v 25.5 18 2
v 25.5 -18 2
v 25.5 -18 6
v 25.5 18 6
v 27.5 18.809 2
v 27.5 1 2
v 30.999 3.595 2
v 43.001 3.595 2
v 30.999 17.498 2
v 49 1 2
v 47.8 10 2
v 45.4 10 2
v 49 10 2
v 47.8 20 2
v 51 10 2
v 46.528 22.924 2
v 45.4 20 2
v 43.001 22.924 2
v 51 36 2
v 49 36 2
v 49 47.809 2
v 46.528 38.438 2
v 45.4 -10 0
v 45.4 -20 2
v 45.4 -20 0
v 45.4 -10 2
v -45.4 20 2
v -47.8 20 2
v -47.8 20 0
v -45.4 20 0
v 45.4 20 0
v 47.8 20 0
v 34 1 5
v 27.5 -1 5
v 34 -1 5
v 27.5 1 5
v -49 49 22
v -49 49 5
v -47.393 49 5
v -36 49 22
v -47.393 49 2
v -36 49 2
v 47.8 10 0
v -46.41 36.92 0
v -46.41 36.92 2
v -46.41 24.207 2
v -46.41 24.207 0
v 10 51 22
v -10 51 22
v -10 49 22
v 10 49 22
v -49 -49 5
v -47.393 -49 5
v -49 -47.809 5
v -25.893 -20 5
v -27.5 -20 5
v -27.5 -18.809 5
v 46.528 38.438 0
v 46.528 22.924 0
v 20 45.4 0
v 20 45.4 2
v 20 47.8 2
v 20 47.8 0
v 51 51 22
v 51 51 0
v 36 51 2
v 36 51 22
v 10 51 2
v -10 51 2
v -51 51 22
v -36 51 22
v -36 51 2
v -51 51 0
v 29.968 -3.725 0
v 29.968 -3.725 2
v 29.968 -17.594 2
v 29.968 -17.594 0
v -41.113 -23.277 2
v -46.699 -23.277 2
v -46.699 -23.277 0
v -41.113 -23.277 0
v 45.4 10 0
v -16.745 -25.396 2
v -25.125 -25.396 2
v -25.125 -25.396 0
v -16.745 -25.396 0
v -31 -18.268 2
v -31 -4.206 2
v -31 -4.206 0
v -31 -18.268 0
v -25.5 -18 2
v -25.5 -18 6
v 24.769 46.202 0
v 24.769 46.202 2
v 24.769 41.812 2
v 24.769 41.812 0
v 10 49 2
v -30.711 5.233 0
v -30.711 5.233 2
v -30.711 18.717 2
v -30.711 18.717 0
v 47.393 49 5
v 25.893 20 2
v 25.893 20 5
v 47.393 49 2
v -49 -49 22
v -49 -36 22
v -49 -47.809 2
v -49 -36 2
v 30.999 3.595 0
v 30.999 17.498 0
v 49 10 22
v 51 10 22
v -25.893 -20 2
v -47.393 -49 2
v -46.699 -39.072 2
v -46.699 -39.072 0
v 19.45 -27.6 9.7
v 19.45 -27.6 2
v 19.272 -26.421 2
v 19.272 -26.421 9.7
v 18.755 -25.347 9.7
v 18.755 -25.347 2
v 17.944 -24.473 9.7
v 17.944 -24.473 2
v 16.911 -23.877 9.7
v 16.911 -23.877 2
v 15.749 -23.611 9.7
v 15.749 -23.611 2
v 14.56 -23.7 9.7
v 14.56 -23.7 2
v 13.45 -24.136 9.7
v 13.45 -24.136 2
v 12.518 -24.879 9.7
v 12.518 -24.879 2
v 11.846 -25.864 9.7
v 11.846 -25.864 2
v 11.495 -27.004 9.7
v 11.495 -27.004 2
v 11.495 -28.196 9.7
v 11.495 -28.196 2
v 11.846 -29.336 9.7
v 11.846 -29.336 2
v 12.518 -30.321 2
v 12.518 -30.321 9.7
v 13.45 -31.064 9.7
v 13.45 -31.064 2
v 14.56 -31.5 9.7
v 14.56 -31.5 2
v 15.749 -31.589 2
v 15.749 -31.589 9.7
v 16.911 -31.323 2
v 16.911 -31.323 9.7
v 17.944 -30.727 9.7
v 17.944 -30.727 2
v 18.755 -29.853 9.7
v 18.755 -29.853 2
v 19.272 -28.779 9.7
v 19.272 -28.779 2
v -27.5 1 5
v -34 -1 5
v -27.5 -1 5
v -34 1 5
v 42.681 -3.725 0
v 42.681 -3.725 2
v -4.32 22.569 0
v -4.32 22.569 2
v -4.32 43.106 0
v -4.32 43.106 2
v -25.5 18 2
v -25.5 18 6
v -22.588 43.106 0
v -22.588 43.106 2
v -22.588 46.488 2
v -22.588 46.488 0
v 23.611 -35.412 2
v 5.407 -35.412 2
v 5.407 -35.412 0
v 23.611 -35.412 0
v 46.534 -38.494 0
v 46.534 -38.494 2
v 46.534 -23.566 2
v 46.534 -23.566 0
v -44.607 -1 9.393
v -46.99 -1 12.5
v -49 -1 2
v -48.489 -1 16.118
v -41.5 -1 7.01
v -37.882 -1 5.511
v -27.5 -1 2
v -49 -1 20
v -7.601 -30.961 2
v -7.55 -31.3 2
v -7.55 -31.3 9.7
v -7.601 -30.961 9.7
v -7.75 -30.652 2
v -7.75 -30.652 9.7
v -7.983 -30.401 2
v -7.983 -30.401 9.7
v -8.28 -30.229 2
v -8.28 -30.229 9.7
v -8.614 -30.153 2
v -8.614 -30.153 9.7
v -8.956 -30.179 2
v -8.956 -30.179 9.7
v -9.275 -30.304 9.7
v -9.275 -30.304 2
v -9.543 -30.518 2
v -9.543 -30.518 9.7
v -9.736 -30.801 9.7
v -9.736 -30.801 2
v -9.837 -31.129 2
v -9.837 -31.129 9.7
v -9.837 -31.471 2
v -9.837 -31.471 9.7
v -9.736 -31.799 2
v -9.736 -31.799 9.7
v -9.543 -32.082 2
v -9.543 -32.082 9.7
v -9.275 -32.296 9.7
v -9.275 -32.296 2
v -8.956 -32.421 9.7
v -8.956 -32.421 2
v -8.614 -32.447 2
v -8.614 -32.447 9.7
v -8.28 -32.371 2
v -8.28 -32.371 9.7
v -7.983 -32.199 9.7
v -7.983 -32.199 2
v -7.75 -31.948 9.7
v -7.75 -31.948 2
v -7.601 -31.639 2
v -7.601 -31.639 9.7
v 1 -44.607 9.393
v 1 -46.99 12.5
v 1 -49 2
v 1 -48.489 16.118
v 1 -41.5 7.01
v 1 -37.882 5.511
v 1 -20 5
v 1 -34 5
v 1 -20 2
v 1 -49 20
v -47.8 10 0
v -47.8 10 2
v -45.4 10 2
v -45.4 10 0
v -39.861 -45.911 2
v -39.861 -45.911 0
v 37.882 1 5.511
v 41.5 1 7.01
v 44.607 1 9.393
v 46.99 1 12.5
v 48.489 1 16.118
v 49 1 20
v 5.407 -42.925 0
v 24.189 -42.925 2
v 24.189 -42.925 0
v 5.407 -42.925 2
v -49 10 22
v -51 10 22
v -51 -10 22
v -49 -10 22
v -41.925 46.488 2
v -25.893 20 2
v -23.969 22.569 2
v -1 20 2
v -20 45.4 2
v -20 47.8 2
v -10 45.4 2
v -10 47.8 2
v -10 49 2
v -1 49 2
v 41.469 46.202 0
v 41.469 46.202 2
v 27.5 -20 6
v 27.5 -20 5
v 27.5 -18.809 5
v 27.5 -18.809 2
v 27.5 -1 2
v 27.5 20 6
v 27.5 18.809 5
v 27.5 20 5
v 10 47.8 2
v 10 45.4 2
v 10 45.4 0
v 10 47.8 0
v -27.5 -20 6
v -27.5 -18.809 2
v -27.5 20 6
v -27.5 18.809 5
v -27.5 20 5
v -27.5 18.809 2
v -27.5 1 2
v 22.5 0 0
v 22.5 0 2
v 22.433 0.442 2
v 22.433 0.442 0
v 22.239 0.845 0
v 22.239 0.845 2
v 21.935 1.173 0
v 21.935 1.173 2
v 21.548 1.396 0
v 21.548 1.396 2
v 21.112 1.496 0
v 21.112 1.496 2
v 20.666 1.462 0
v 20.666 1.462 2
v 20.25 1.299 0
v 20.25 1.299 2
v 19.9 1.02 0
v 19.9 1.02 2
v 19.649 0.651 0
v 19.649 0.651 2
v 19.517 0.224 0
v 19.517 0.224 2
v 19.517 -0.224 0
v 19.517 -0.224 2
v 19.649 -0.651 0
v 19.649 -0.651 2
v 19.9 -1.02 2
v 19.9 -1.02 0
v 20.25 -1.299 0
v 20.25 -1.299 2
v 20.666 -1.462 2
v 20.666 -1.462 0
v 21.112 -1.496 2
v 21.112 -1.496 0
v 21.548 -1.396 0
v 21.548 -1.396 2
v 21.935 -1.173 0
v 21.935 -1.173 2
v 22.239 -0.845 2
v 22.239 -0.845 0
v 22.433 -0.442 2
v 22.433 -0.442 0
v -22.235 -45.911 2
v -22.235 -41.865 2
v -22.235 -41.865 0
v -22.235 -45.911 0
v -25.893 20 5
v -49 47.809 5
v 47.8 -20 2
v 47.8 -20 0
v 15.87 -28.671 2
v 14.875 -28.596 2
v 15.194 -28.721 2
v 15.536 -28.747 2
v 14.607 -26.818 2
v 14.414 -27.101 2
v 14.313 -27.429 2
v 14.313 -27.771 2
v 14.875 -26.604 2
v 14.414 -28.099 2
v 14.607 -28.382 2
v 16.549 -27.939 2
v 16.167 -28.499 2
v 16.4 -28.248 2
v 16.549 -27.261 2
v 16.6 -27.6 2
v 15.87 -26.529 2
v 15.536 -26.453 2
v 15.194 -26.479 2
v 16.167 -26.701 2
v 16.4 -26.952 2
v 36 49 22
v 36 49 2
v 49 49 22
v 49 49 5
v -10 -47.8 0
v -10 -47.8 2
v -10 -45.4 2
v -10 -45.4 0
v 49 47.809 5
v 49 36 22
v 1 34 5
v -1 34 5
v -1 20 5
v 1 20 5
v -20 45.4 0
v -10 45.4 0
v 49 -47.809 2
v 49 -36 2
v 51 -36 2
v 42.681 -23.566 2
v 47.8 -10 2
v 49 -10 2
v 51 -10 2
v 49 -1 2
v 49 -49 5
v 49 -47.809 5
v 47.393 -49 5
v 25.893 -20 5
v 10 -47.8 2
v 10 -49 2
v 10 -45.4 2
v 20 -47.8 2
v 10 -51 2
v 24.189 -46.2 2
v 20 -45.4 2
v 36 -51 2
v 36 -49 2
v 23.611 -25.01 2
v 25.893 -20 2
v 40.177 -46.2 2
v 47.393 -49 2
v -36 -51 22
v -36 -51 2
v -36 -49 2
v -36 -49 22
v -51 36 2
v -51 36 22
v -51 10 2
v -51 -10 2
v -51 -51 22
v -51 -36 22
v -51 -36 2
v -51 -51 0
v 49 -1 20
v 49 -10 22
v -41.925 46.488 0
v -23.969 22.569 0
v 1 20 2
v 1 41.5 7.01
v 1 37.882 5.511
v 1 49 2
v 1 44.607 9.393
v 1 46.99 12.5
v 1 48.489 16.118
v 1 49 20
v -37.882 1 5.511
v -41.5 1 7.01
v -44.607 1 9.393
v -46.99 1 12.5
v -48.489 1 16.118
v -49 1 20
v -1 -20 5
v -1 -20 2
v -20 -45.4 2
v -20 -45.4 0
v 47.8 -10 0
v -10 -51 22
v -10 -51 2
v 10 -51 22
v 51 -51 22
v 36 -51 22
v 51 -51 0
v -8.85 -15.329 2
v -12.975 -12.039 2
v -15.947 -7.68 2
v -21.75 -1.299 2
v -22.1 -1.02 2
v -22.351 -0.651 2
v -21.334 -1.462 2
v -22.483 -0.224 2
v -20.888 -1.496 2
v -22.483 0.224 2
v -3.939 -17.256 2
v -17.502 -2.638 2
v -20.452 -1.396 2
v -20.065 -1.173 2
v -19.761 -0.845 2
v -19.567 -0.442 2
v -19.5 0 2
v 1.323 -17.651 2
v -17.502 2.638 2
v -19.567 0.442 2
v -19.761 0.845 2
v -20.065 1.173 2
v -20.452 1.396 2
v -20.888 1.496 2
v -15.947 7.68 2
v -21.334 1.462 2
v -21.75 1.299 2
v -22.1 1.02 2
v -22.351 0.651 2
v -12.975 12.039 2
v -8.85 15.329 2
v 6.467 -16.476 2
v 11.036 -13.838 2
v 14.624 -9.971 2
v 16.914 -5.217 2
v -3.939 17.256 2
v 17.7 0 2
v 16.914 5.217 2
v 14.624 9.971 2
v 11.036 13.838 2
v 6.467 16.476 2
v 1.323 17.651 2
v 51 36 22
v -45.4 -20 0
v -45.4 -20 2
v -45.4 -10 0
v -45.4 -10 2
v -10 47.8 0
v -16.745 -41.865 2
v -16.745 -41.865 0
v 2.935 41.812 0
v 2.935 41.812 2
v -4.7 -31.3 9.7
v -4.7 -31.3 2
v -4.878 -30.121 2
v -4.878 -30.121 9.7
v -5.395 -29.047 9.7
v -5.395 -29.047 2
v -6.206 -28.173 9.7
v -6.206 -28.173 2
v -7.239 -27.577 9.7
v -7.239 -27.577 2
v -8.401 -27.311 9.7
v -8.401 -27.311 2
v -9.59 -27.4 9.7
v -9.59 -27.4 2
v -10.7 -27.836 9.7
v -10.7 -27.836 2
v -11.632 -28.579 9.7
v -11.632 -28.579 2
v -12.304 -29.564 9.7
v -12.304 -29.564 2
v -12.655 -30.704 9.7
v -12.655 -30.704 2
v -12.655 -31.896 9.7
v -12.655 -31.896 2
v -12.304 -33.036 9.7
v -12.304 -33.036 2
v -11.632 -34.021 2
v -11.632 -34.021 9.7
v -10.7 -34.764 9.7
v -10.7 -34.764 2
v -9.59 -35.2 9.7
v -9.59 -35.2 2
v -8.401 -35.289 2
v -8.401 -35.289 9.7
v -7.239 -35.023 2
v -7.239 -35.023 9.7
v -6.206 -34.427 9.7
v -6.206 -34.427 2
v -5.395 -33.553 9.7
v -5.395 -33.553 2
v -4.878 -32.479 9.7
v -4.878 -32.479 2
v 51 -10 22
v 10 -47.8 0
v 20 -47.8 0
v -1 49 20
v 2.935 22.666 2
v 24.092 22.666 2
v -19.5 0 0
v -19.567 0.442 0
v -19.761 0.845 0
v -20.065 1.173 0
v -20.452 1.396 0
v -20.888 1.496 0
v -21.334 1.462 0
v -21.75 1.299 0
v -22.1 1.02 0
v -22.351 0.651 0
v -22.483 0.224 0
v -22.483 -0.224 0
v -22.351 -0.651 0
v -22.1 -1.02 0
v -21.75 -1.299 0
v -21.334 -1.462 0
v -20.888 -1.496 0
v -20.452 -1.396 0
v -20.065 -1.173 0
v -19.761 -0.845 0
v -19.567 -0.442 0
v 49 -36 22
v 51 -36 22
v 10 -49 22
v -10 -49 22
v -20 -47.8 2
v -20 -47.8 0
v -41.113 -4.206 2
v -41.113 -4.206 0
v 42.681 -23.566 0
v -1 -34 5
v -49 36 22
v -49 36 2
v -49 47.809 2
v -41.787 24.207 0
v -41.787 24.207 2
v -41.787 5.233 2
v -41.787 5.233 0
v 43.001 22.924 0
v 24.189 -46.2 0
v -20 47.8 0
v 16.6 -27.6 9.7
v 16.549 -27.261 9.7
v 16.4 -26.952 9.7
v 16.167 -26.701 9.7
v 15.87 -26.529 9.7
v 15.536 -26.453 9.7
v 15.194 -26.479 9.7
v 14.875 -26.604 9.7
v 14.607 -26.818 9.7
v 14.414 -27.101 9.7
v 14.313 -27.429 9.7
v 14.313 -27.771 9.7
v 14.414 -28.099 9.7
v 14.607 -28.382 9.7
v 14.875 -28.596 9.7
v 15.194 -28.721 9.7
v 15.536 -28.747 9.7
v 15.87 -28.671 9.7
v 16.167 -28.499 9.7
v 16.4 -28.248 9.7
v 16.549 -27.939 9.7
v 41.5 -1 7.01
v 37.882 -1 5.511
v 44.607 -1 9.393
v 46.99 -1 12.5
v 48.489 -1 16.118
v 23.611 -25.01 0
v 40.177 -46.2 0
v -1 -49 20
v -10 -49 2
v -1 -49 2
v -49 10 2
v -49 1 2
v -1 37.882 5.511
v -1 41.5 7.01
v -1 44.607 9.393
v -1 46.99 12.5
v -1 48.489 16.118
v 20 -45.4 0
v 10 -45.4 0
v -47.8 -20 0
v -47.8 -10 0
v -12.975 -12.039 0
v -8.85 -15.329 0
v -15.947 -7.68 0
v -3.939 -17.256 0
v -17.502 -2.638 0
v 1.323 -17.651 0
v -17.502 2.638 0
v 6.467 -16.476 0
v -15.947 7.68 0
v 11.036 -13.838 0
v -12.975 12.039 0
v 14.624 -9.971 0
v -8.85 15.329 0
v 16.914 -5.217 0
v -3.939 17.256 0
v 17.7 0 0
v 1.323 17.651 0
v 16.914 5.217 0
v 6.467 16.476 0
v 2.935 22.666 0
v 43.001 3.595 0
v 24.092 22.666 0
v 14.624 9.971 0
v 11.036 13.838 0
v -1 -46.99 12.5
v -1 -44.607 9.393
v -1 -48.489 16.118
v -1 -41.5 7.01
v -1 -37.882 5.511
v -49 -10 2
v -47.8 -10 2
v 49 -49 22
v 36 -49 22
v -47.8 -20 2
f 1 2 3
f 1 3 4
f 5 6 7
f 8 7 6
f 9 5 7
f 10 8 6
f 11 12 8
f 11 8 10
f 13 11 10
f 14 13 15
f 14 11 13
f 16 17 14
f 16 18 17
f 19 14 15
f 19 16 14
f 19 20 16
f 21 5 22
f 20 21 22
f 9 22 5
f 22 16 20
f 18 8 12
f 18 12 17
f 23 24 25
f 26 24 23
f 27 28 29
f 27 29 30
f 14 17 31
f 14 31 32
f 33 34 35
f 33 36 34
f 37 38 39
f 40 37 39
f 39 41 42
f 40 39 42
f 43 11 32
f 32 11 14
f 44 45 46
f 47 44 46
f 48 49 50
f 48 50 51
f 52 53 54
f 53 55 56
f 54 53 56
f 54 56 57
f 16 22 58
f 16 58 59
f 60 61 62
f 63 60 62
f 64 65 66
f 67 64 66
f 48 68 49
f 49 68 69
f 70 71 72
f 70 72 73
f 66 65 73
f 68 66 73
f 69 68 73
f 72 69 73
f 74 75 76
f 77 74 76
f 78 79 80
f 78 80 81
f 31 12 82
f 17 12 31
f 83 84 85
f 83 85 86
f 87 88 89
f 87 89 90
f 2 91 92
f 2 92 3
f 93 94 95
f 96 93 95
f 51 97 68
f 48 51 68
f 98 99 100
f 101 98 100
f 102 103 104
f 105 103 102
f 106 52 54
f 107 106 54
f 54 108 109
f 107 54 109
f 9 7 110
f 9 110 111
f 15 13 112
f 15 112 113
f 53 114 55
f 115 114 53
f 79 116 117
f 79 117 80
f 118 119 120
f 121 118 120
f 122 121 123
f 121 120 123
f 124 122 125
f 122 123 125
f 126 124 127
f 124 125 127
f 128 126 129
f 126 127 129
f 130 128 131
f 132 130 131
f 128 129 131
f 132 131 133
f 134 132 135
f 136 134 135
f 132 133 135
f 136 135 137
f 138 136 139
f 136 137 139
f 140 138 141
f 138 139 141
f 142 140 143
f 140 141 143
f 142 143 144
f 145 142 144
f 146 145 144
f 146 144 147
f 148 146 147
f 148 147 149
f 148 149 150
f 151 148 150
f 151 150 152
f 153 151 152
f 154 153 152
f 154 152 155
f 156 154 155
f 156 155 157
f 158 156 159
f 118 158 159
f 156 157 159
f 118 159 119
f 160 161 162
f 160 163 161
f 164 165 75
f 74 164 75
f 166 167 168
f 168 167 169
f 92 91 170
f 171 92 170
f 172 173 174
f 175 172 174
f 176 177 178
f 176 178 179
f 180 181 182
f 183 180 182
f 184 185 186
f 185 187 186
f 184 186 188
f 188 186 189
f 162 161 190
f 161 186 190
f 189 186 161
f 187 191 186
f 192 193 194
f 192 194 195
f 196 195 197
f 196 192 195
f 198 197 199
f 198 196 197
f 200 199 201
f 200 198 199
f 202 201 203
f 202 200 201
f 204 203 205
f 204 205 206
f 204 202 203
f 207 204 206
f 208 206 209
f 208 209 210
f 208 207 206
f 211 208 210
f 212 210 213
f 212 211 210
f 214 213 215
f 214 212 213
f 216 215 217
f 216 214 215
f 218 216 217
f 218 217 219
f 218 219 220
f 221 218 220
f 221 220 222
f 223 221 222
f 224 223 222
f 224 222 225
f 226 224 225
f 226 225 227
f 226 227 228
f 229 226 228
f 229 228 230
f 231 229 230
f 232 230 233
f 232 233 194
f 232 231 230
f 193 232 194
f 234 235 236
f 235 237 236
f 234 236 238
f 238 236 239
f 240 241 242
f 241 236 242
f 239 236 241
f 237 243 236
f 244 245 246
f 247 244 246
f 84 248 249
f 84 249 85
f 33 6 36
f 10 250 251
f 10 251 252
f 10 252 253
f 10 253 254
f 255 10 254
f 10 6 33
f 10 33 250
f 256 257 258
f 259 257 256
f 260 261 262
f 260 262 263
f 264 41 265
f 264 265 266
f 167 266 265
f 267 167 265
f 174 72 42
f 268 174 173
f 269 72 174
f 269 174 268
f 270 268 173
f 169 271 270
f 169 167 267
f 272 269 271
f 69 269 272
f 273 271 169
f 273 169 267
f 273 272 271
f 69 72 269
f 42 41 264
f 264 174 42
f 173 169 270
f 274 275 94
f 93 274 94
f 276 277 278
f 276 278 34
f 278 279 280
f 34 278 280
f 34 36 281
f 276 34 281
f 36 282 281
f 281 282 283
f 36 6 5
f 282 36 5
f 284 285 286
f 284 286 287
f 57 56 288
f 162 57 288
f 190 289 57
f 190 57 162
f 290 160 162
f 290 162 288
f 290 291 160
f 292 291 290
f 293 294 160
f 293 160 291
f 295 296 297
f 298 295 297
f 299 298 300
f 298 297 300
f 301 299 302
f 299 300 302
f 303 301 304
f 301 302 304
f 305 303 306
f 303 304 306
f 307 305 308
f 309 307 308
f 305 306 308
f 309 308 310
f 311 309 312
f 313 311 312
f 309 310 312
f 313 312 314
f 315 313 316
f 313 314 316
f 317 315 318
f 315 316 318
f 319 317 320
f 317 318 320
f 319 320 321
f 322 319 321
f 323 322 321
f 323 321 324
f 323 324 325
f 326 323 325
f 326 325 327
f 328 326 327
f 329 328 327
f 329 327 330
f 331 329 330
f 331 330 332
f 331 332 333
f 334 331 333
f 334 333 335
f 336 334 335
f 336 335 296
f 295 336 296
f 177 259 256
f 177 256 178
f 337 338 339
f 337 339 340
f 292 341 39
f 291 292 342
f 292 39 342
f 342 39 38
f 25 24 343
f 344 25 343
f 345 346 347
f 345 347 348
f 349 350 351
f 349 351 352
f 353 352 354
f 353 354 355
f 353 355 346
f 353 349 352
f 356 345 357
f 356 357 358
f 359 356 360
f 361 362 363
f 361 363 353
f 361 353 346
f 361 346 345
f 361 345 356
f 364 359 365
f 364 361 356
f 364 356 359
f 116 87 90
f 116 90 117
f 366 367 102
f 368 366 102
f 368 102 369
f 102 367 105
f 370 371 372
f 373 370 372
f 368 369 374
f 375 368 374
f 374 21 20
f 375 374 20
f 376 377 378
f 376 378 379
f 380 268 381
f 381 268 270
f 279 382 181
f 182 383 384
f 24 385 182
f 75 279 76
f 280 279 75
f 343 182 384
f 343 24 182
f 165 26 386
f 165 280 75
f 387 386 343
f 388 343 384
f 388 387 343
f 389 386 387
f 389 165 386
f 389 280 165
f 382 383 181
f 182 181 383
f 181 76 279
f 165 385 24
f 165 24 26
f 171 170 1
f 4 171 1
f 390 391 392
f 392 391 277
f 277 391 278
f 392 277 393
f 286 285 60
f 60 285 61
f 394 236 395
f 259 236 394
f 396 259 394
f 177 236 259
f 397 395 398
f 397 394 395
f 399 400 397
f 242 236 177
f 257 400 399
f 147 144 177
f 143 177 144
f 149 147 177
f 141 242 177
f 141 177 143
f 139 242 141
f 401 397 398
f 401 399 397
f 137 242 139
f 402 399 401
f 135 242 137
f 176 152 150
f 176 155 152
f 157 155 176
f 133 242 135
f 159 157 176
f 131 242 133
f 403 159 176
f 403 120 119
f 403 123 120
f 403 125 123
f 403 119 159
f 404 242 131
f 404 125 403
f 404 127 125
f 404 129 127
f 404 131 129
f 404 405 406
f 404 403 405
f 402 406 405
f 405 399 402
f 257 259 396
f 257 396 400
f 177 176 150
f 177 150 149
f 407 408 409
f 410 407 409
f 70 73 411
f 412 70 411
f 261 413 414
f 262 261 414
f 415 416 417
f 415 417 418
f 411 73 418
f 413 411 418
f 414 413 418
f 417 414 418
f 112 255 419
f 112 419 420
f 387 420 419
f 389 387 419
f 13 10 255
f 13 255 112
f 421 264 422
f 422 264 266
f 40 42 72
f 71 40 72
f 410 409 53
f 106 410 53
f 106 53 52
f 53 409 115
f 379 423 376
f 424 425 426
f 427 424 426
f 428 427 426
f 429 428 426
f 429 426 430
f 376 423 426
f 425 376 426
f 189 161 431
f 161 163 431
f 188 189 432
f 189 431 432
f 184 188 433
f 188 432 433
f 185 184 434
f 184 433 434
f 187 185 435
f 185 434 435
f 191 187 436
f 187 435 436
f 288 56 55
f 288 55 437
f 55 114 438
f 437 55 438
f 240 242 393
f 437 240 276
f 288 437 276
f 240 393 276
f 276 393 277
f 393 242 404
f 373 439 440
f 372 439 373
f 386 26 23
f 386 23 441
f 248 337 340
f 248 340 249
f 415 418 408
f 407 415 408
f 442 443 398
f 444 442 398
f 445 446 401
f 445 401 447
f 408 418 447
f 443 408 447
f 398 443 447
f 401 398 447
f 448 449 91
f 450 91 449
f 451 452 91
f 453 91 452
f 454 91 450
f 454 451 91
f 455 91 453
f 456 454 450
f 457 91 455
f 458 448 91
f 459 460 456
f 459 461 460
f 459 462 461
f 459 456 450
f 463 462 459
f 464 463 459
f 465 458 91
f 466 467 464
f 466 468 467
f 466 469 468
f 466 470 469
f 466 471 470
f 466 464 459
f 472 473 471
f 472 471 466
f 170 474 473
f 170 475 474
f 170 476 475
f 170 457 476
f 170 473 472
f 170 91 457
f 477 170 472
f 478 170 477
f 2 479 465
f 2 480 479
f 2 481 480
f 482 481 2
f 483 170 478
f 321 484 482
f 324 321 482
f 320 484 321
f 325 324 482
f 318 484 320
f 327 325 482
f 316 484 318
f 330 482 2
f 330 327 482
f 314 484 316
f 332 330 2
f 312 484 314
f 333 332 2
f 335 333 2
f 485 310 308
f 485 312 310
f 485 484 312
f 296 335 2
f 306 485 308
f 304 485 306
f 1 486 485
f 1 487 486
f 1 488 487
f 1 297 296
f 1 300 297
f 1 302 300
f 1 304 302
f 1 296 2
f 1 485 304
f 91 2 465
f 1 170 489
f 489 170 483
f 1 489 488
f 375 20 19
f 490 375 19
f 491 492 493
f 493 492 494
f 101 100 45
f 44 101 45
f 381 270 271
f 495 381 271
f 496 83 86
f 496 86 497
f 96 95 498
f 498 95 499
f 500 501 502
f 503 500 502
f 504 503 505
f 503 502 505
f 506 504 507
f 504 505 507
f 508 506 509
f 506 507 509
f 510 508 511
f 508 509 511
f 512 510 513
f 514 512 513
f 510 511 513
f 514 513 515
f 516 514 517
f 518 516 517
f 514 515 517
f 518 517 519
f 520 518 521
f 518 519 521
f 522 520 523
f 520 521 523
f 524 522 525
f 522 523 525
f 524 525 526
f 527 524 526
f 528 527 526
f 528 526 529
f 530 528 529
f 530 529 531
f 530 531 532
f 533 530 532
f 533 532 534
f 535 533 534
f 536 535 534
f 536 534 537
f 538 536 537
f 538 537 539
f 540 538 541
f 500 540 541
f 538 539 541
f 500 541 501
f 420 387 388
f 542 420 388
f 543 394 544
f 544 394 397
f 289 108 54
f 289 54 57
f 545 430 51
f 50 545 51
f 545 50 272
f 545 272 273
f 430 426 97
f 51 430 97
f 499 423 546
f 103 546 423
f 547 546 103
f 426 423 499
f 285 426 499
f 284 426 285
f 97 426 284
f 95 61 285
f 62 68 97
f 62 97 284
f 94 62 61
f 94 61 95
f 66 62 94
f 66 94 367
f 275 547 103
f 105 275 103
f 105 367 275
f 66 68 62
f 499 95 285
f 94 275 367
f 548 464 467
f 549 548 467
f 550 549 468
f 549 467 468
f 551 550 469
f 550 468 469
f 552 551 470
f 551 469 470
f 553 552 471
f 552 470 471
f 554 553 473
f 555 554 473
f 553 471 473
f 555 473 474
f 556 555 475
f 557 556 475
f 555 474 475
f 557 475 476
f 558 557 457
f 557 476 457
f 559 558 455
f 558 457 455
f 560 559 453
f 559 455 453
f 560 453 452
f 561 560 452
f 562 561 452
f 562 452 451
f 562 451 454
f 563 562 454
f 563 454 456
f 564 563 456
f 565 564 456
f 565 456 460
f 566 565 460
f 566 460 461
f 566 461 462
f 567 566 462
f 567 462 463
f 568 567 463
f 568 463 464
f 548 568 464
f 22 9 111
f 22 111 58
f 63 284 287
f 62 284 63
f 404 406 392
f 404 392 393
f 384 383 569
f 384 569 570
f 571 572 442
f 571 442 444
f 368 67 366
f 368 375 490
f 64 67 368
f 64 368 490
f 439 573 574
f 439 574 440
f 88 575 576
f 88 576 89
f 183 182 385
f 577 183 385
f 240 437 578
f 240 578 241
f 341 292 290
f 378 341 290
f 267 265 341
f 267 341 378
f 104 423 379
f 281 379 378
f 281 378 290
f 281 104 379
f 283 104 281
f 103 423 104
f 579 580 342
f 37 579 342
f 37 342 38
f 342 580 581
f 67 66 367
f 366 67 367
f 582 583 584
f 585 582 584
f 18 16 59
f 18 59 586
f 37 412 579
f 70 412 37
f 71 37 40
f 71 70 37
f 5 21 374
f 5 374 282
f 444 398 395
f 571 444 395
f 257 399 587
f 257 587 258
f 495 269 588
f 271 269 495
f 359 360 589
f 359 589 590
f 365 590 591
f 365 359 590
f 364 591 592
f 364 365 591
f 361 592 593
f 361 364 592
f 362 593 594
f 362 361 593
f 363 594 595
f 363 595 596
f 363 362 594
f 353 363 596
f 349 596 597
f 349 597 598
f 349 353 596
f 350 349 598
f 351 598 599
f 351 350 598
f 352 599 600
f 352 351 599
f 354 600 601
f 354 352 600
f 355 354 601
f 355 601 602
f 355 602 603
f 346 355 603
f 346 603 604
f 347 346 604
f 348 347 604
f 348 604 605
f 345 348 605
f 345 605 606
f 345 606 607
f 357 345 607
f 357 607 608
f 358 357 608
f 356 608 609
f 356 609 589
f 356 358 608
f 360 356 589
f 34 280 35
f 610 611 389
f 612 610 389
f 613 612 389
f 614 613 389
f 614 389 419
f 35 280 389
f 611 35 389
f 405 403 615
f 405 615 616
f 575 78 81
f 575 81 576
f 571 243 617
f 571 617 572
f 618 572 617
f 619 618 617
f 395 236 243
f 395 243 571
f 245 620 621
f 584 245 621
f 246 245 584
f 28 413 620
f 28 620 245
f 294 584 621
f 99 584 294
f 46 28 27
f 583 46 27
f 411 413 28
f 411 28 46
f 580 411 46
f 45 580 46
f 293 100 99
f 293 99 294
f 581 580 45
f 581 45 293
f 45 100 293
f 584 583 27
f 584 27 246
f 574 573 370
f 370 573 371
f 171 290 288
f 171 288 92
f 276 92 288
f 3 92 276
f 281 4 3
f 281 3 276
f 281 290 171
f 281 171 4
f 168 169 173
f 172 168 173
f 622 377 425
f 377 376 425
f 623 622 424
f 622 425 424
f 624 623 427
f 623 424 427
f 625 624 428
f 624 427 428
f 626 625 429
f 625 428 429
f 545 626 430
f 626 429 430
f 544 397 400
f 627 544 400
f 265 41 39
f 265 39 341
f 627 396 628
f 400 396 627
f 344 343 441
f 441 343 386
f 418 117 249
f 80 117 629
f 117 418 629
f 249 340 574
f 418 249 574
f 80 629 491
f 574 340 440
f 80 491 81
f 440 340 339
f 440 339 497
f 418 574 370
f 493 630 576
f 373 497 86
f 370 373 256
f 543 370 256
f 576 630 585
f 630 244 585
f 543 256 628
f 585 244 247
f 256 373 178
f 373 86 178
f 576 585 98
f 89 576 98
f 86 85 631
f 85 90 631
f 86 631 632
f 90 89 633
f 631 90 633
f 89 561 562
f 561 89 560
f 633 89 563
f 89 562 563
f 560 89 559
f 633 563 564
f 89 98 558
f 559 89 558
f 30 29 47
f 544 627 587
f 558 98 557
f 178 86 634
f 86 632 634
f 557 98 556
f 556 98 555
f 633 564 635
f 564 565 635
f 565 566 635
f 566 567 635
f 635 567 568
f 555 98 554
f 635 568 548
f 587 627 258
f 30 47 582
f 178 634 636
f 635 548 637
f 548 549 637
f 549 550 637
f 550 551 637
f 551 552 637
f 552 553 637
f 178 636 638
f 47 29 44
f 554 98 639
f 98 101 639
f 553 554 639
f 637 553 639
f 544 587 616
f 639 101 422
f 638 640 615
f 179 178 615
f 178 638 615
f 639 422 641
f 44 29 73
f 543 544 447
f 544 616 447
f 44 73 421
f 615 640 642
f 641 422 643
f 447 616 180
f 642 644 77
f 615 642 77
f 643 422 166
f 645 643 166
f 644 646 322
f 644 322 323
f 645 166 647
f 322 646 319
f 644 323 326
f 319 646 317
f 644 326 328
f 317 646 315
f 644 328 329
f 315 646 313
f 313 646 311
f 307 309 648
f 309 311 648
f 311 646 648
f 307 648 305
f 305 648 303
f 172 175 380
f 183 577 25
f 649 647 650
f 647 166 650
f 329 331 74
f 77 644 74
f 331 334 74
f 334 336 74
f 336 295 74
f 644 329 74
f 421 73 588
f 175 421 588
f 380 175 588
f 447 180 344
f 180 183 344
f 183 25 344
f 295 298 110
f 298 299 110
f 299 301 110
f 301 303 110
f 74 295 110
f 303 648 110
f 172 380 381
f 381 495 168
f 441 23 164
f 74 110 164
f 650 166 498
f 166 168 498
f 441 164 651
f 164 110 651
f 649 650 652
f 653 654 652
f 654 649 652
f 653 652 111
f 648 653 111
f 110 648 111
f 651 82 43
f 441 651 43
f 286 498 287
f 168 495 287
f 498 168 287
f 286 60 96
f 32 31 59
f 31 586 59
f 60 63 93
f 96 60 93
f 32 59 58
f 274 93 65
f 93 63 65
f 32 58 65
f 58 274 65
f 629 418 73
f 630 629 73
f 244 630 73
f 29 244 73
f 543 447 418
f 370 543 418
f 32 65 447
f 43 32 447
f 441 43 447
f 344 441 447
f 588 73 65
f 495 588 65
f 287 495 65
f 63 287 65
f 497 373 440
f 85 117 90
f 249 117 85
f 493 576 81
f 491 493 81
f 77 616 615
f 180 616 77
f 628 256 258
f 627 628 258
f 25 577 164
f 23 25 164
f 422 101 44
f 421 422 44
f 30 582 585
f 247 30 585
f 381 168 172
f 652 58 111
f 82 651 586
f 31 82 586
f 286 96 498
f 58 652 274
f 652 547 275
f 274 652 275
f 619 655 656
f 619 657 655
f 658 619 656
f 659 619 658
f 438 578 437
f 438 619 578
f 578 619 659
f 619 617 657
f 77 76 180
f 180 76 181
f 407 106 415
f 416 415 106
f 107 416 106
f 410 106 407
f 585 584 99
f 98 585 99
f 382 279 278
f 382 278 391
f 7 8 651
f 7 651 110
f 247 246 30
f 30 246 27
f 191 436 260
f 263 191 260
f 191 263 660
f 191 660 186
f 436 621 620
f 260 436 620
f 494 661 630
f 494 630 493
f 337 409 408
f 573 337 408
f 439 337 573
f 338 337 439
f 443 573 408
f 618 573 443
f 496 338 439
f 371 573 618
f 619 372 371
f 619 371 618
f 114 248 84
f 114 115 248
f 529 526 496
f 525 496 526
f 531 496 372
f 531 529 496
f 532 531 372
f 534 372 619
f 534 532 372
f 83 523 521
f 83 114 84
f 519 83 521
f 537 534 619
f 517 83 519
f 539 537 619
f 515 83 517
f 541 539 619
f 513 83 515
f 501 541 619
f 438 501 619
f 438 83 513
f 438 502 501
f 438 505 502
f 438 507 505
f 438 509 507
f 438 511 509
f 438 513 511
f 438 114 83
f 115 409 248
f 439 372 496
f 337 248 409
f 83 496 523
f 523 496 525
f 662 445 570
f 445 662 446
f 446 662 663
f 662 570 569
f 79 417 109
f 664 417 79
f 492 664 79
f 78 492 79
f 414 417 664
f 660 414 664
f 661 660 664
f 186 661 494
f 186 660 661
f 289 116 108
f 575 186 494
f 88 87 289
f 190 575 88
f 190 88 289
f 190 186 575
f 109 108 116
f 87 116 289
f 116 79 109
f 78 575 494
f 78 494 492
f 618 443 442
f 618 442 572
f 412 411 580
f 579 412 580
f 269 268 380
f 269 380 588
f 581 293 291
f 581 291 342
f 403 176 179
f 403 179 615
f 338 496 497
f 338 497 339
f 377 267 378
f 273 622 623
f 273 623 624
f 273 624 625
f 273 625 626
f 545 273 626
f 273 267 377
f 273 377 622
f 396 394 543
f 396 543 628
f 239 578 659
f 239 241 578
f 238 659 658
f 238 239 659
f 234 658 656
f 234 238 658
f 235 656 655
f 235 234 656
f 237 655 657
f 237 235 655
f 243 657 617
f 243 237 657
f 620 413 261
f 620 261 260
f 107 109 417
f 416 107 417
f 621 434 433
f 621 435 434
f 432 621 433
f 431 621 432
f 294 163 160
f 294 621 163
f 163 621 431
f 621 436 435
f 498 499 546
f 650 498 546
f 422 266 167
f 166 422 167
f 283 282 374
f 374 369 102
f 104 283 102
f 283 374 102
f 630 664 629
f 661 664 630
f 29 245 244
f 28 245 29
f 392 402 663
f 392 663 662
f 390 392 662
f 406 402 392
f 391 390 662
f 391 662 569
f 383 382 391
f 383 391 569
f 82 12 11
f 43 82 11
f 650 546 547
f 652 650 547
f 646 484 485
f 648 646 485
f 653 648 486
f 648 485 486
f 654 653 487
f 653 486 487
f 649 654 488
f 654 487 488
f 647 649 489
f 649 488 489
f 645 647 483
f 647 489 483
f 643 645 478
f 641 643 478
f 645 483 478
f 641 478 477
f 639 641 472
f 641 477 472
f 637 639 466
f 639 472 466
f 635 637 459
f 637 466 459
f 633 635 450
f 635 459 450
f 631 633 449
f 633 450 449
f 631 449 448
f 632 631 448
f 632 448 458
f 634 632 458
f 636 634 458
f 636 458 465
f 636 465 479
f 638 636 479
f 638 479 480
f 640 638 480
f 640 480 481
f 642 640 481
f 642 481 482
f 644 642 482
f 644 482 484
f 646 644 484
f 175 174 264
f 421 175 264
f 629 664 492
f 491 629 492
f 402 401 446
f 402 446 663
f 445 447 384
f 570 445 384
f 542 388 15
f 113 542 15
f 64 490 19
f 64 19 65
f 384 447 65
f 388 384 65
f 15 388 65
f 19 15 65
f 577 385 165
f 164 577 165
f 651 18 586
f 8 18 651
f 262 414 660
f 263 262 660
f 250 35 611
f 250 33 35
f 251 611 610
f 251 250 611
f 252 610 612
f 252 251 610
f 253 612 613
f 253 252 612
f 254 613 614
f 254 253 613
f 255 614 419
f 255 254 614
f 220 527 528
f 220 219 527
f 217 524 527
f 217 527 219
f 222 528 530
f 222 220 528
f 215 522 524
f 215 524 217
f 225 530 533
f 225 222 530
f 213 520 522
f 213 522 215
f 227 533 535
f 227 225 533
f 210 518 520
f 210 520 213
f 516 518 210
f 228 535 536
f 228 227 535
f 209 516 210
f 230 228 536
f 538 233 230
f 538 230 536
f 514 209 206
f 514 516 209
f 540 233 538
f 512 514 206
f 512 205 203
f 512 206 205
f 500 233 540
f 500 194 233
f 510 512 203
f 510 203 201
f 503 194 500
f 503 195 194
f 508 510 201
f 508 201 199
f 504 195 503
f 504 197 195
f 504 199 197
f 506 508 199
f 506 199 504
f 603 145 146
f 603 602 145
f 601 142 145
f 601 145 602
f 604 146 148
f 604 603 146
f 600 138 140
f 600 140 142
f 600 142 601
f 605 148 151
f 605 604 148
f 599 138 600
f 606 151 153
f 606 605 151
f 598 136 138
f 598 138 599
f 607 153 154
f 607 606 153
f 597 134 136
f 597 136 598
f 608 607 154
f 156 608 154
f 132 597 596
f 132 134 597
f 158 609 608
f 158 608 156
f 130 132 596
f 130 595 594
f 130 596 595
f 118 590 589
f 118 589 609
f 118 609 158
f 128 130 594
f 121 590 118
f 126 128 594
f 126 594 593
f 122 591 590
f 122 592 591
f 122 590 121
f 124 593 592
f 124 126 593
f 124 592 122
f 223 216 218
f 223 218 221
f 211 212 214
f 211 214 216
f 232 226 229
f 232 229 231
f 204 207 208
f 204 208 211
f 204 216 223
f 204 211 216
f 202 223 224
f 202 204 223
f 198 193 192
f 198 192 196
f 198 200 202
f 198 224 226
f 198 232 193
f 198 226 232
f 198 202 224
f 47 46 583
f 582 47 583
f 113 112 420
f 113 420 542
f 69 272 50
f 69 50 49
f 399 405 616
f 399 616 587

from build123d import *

# Parameters (mm, degrees)
SKETCH_W        = 102
SKETCH_H        = 102
PAD_DEPTH       = 2
SKETCH001_R     = 17.7
SKETCH001_R_2   = 1.5
SKETCH001_W     = 10
SKETCH001_H     = 2.4
SKETCH001_W_2   = 2.4
SKETCH001_H_2   = 10
POCKET_DEPTH    = 2.001
SKETCH002_R     = 4
SKETCH002_R_2   = 1.15
PAD001_DEPTH    = 7.7
SKETCH003_W     = 20
SKETCH003_H     = 2
SKETCH003_W_2   = 2
SKETCH003_H_2   = 20
PAD002_DEPTH    = 20
SKETCH004_W     = 55
SKETCH004_H     = 40
SKETCH004_W_2   = 51
SKETCH004_H_2   = 36
PAD003_DEPTH    = 4
SKETCH005_W     = 2
SKETCH005_H     = 29
SKETCH005_W_2   = 21.5
SKETCH005_H_2   = 2
PAD004_DEPTH    = 3
POCKET001_DEPTH = 2.001
FILLET_R        = 15


with BuildPart() as part:
    # Sketch → Pad (new body)
    with BuildSketch(Plane.XY):
        Rectangle(SKETCH_W, SKETCH_H)
    extrude(amount=PAD_DEPTH)

    # Sketch001 → Pocket (cut, through all)
    with BuildSketch(Plane.XY.offset(2)):
        Circle(SKETCH001_R)
        with Locations((-21, 0)):
            Circle(SKETCH001_R_2)
        with Locations((21, 0)):
            Circle(SKETCH001_R_2)
        with Locations((-15, 46.6)):
            Rectangle(SKETCH001_W, SKETCH001_H)
        with Locations((15, 46.6)):
            Rectangle(SKETCH001_W, SKETCH001_H)
        with Locations((46.6, 15)):
            Rectangle(SKETCH001_W_2, SKETCH001_H_2)
        with Locations((46.6, -15)):
            Rectangle(SKETCH001_W_2, SKETCH001_H_2)
        with Locations((15, -46.6)):
            Rectangle(SKETCH001_W, SKETCH001_H)
        with Locations((-15, -46.6)):
            Rectangle(SKETCH001_W, SKETCH001_H)
        with Locations((-46.6, 15)):
            Rectangle(SKETCH001_W_2, SKETCH001_H_2)
        with Locations((-46.6, -15)):
            Rectangle(SKETCH001_W_2, SKETCH001_H_2)
    extrude(amount=-POCKET_DEPTH, mode=Mode.SUBTRACT)

    # Sketch002 → Pad001 (new body)
    with BuildSketch(Plane.XY.offset(2)):
        with Locations((15.45, -27.6)):
            Circle(SKETCH002_R)
        with Locations((15.45, -27.6)):
            Circle(SKETCH002_R_2, mode=Mode.SUBTRACT)
        with Locations((-8.7, -31.3)):
            Circle(SKETCH002_R)
        with Locations((-8.7, -31.3)):
            Circle(SKETCH002_R_2, mode=Mode.SUBTRACT)
    extrude(amount=PAD001_DEPTH)

    # Sketch003 → Pad002 (new body)
    with BuildSketch(Plane.XY.offset(2)):
        Polygon((-51, 36), (-49, 36), (-49, 49), (-36, 49), (-36, 51), (-51, 51), align=None)
        Polygon((36, 51), (36, 49), (49, 49), (49, 36), (51, 36), (51, 51), align=None)
        Polygon((51, -36), (51, -51), (36, -51), (36, -49), (49, -49), (49, -36), align=None)
        Polygon((-51, -51), (-36, -51), (-36, -49), (-49, -49), (-49, -36), (-51, -36), align=None)
        with Locations((0, 50)):
            Rectangle(SKETCH003_W, SKETCH003_H)
        with Locations((50, 0)):
            Rectangle(SKETCH003_W_2, SKETCH003_H_2)
        with Locations((0, -50)):
            Rectangle(SKETCH003_W, SKETCH003_H)
        with Locations((-50, 0)):
            Rectangle(SKETCH003_W_2, SKETCH003_H_2)
    extrude(amount=PAD002_DEPTH)

    # Sketch004 → Pad003 (new body)
    with BuildSketch(Plane.XY.offset(2)):
        Rectangle(SKETCH004_W, SKETCH004_H)
        Rectangle(SKETCH004_W_2, SKETCH004_H_2, mode=Mode.SUBTRACT)
    extrude(amount=PAD003_DEPTH)

    # Sketch005 → Pad004 (new body)
    with BuildSketch(Plane.XY.offset(2)):
        with Locations((0, 34.5)):
            Rectangle(SKETCH005_W, SKETCH005_H)
        with Locations((38.25, 0)):
            Rectangle(SKETCH005_W_2, SKETCH005_H_2)
        with Locations((0, -34.5)):
            Rectangle(SKETCH005_W, SKETCH005_H)
        with Locations((-38.25, 0)):
            Rectangle(SKETCH005_W_2, SKETCH005_H_2)
        Polygon((-27.5, 18.808883), (-49, 47.808883), (-49, 49), (-47.393376, 49), (-25.893376, 20), (-27.5, 20), align=None)
        Polygon((25.893376, 20), (47.393376, 49), (49, 49), (49, 47.808883), (27.5, 18.808883), (27.5, 20), align=None)
        Polygon((47.393376, -49), (25.893376, -20), (27.5, -20), (27.5, -18.808883), (49, -47.808883), (49, -49), align=None)
        Polygon((-47.393376, -49), (-49, -49), (-49, -47.808883), (-27.5, -18.808883), (-27.5, -20), (-25.893376, -20), align=None)
    extrude(amount=PAD004_DEPTH)

    # Sketch006 → Pocket001 (cut, through all)
    with BuildSketch(Plane.XY.offset(2)):
        Polygon((-41.925284, 46.487865), (-23.968742, 22.569384), (-4.320471, 22.569384), (-4.320471, 43.105819), (-22.587998, 43.105819), (-22.587998, 46.487865), align=None)
        Polygon((2.93549, 41.811786), (2.93549, 22.665701), (24.092464, 22.665701), (41.469131, 46.201939), (24.769491, 46.201939), (24.769491, 41.811786), align=None)
        Polygon((46.52763, 38.437729), (46.52763, 22.923718), (43.001148, 22.923718), (43.001148, 3.595317), (30.999222, 3.595317), (30.999222, 17.497902), align=None)
        Polygon((46.533894, -38.494362), (46.533894, -23.565529), (42.681282, -23.565529), (42.681282, -3.724627), (29.967691, -3.724627), (29.967691, -17.593996), align=None)
        Polygon((40.177086, -46.199566), (24.188789, -46.199566), (24.188789, -42.924854), (5.40735, -42.924854), (5.40735, -35.412281), (23.610897, -35.412281), (23.610897, -25.010254), align=None)
        Polygon((-39.860725, -45.910622), (-25.124525, -25.395514), (-16.745111, -25.395514), (-16.745111, -41.865391), (-22.235073, -41.865391), (-22.235073, -45.910622), align=None)
        Polygon((-46.410149, 36.92033), (-46.410149, 24.206741), (-41.787029, 24.206741), (-41.787029, 5.232674), (-30.710796, 5.232674), (-30.710796, 18.71678), align=None)
        Polygon((-46.699104, -39.072254), (-46.699104, -23.276583), (-41.112823, -23.276583), (-41.112823, -4.206202), (-30.999743, -4.206202), (-30.999743, -18.2682), align=None)
    extrude(amount=-POCKET001_DEPTH, mode=Mode.SUBTRACT)

    # Fillet
    fillet_edges = [part.edges().sort_by_distance(p)[0] for p in [
        (-49, 0, 5),
        (0, 49, 5),
        (49, 0, 5),
        (0, -49, 5),
    ]]
    fillet(fillet_edges, radius=FILLET_R)


solid = part.part
